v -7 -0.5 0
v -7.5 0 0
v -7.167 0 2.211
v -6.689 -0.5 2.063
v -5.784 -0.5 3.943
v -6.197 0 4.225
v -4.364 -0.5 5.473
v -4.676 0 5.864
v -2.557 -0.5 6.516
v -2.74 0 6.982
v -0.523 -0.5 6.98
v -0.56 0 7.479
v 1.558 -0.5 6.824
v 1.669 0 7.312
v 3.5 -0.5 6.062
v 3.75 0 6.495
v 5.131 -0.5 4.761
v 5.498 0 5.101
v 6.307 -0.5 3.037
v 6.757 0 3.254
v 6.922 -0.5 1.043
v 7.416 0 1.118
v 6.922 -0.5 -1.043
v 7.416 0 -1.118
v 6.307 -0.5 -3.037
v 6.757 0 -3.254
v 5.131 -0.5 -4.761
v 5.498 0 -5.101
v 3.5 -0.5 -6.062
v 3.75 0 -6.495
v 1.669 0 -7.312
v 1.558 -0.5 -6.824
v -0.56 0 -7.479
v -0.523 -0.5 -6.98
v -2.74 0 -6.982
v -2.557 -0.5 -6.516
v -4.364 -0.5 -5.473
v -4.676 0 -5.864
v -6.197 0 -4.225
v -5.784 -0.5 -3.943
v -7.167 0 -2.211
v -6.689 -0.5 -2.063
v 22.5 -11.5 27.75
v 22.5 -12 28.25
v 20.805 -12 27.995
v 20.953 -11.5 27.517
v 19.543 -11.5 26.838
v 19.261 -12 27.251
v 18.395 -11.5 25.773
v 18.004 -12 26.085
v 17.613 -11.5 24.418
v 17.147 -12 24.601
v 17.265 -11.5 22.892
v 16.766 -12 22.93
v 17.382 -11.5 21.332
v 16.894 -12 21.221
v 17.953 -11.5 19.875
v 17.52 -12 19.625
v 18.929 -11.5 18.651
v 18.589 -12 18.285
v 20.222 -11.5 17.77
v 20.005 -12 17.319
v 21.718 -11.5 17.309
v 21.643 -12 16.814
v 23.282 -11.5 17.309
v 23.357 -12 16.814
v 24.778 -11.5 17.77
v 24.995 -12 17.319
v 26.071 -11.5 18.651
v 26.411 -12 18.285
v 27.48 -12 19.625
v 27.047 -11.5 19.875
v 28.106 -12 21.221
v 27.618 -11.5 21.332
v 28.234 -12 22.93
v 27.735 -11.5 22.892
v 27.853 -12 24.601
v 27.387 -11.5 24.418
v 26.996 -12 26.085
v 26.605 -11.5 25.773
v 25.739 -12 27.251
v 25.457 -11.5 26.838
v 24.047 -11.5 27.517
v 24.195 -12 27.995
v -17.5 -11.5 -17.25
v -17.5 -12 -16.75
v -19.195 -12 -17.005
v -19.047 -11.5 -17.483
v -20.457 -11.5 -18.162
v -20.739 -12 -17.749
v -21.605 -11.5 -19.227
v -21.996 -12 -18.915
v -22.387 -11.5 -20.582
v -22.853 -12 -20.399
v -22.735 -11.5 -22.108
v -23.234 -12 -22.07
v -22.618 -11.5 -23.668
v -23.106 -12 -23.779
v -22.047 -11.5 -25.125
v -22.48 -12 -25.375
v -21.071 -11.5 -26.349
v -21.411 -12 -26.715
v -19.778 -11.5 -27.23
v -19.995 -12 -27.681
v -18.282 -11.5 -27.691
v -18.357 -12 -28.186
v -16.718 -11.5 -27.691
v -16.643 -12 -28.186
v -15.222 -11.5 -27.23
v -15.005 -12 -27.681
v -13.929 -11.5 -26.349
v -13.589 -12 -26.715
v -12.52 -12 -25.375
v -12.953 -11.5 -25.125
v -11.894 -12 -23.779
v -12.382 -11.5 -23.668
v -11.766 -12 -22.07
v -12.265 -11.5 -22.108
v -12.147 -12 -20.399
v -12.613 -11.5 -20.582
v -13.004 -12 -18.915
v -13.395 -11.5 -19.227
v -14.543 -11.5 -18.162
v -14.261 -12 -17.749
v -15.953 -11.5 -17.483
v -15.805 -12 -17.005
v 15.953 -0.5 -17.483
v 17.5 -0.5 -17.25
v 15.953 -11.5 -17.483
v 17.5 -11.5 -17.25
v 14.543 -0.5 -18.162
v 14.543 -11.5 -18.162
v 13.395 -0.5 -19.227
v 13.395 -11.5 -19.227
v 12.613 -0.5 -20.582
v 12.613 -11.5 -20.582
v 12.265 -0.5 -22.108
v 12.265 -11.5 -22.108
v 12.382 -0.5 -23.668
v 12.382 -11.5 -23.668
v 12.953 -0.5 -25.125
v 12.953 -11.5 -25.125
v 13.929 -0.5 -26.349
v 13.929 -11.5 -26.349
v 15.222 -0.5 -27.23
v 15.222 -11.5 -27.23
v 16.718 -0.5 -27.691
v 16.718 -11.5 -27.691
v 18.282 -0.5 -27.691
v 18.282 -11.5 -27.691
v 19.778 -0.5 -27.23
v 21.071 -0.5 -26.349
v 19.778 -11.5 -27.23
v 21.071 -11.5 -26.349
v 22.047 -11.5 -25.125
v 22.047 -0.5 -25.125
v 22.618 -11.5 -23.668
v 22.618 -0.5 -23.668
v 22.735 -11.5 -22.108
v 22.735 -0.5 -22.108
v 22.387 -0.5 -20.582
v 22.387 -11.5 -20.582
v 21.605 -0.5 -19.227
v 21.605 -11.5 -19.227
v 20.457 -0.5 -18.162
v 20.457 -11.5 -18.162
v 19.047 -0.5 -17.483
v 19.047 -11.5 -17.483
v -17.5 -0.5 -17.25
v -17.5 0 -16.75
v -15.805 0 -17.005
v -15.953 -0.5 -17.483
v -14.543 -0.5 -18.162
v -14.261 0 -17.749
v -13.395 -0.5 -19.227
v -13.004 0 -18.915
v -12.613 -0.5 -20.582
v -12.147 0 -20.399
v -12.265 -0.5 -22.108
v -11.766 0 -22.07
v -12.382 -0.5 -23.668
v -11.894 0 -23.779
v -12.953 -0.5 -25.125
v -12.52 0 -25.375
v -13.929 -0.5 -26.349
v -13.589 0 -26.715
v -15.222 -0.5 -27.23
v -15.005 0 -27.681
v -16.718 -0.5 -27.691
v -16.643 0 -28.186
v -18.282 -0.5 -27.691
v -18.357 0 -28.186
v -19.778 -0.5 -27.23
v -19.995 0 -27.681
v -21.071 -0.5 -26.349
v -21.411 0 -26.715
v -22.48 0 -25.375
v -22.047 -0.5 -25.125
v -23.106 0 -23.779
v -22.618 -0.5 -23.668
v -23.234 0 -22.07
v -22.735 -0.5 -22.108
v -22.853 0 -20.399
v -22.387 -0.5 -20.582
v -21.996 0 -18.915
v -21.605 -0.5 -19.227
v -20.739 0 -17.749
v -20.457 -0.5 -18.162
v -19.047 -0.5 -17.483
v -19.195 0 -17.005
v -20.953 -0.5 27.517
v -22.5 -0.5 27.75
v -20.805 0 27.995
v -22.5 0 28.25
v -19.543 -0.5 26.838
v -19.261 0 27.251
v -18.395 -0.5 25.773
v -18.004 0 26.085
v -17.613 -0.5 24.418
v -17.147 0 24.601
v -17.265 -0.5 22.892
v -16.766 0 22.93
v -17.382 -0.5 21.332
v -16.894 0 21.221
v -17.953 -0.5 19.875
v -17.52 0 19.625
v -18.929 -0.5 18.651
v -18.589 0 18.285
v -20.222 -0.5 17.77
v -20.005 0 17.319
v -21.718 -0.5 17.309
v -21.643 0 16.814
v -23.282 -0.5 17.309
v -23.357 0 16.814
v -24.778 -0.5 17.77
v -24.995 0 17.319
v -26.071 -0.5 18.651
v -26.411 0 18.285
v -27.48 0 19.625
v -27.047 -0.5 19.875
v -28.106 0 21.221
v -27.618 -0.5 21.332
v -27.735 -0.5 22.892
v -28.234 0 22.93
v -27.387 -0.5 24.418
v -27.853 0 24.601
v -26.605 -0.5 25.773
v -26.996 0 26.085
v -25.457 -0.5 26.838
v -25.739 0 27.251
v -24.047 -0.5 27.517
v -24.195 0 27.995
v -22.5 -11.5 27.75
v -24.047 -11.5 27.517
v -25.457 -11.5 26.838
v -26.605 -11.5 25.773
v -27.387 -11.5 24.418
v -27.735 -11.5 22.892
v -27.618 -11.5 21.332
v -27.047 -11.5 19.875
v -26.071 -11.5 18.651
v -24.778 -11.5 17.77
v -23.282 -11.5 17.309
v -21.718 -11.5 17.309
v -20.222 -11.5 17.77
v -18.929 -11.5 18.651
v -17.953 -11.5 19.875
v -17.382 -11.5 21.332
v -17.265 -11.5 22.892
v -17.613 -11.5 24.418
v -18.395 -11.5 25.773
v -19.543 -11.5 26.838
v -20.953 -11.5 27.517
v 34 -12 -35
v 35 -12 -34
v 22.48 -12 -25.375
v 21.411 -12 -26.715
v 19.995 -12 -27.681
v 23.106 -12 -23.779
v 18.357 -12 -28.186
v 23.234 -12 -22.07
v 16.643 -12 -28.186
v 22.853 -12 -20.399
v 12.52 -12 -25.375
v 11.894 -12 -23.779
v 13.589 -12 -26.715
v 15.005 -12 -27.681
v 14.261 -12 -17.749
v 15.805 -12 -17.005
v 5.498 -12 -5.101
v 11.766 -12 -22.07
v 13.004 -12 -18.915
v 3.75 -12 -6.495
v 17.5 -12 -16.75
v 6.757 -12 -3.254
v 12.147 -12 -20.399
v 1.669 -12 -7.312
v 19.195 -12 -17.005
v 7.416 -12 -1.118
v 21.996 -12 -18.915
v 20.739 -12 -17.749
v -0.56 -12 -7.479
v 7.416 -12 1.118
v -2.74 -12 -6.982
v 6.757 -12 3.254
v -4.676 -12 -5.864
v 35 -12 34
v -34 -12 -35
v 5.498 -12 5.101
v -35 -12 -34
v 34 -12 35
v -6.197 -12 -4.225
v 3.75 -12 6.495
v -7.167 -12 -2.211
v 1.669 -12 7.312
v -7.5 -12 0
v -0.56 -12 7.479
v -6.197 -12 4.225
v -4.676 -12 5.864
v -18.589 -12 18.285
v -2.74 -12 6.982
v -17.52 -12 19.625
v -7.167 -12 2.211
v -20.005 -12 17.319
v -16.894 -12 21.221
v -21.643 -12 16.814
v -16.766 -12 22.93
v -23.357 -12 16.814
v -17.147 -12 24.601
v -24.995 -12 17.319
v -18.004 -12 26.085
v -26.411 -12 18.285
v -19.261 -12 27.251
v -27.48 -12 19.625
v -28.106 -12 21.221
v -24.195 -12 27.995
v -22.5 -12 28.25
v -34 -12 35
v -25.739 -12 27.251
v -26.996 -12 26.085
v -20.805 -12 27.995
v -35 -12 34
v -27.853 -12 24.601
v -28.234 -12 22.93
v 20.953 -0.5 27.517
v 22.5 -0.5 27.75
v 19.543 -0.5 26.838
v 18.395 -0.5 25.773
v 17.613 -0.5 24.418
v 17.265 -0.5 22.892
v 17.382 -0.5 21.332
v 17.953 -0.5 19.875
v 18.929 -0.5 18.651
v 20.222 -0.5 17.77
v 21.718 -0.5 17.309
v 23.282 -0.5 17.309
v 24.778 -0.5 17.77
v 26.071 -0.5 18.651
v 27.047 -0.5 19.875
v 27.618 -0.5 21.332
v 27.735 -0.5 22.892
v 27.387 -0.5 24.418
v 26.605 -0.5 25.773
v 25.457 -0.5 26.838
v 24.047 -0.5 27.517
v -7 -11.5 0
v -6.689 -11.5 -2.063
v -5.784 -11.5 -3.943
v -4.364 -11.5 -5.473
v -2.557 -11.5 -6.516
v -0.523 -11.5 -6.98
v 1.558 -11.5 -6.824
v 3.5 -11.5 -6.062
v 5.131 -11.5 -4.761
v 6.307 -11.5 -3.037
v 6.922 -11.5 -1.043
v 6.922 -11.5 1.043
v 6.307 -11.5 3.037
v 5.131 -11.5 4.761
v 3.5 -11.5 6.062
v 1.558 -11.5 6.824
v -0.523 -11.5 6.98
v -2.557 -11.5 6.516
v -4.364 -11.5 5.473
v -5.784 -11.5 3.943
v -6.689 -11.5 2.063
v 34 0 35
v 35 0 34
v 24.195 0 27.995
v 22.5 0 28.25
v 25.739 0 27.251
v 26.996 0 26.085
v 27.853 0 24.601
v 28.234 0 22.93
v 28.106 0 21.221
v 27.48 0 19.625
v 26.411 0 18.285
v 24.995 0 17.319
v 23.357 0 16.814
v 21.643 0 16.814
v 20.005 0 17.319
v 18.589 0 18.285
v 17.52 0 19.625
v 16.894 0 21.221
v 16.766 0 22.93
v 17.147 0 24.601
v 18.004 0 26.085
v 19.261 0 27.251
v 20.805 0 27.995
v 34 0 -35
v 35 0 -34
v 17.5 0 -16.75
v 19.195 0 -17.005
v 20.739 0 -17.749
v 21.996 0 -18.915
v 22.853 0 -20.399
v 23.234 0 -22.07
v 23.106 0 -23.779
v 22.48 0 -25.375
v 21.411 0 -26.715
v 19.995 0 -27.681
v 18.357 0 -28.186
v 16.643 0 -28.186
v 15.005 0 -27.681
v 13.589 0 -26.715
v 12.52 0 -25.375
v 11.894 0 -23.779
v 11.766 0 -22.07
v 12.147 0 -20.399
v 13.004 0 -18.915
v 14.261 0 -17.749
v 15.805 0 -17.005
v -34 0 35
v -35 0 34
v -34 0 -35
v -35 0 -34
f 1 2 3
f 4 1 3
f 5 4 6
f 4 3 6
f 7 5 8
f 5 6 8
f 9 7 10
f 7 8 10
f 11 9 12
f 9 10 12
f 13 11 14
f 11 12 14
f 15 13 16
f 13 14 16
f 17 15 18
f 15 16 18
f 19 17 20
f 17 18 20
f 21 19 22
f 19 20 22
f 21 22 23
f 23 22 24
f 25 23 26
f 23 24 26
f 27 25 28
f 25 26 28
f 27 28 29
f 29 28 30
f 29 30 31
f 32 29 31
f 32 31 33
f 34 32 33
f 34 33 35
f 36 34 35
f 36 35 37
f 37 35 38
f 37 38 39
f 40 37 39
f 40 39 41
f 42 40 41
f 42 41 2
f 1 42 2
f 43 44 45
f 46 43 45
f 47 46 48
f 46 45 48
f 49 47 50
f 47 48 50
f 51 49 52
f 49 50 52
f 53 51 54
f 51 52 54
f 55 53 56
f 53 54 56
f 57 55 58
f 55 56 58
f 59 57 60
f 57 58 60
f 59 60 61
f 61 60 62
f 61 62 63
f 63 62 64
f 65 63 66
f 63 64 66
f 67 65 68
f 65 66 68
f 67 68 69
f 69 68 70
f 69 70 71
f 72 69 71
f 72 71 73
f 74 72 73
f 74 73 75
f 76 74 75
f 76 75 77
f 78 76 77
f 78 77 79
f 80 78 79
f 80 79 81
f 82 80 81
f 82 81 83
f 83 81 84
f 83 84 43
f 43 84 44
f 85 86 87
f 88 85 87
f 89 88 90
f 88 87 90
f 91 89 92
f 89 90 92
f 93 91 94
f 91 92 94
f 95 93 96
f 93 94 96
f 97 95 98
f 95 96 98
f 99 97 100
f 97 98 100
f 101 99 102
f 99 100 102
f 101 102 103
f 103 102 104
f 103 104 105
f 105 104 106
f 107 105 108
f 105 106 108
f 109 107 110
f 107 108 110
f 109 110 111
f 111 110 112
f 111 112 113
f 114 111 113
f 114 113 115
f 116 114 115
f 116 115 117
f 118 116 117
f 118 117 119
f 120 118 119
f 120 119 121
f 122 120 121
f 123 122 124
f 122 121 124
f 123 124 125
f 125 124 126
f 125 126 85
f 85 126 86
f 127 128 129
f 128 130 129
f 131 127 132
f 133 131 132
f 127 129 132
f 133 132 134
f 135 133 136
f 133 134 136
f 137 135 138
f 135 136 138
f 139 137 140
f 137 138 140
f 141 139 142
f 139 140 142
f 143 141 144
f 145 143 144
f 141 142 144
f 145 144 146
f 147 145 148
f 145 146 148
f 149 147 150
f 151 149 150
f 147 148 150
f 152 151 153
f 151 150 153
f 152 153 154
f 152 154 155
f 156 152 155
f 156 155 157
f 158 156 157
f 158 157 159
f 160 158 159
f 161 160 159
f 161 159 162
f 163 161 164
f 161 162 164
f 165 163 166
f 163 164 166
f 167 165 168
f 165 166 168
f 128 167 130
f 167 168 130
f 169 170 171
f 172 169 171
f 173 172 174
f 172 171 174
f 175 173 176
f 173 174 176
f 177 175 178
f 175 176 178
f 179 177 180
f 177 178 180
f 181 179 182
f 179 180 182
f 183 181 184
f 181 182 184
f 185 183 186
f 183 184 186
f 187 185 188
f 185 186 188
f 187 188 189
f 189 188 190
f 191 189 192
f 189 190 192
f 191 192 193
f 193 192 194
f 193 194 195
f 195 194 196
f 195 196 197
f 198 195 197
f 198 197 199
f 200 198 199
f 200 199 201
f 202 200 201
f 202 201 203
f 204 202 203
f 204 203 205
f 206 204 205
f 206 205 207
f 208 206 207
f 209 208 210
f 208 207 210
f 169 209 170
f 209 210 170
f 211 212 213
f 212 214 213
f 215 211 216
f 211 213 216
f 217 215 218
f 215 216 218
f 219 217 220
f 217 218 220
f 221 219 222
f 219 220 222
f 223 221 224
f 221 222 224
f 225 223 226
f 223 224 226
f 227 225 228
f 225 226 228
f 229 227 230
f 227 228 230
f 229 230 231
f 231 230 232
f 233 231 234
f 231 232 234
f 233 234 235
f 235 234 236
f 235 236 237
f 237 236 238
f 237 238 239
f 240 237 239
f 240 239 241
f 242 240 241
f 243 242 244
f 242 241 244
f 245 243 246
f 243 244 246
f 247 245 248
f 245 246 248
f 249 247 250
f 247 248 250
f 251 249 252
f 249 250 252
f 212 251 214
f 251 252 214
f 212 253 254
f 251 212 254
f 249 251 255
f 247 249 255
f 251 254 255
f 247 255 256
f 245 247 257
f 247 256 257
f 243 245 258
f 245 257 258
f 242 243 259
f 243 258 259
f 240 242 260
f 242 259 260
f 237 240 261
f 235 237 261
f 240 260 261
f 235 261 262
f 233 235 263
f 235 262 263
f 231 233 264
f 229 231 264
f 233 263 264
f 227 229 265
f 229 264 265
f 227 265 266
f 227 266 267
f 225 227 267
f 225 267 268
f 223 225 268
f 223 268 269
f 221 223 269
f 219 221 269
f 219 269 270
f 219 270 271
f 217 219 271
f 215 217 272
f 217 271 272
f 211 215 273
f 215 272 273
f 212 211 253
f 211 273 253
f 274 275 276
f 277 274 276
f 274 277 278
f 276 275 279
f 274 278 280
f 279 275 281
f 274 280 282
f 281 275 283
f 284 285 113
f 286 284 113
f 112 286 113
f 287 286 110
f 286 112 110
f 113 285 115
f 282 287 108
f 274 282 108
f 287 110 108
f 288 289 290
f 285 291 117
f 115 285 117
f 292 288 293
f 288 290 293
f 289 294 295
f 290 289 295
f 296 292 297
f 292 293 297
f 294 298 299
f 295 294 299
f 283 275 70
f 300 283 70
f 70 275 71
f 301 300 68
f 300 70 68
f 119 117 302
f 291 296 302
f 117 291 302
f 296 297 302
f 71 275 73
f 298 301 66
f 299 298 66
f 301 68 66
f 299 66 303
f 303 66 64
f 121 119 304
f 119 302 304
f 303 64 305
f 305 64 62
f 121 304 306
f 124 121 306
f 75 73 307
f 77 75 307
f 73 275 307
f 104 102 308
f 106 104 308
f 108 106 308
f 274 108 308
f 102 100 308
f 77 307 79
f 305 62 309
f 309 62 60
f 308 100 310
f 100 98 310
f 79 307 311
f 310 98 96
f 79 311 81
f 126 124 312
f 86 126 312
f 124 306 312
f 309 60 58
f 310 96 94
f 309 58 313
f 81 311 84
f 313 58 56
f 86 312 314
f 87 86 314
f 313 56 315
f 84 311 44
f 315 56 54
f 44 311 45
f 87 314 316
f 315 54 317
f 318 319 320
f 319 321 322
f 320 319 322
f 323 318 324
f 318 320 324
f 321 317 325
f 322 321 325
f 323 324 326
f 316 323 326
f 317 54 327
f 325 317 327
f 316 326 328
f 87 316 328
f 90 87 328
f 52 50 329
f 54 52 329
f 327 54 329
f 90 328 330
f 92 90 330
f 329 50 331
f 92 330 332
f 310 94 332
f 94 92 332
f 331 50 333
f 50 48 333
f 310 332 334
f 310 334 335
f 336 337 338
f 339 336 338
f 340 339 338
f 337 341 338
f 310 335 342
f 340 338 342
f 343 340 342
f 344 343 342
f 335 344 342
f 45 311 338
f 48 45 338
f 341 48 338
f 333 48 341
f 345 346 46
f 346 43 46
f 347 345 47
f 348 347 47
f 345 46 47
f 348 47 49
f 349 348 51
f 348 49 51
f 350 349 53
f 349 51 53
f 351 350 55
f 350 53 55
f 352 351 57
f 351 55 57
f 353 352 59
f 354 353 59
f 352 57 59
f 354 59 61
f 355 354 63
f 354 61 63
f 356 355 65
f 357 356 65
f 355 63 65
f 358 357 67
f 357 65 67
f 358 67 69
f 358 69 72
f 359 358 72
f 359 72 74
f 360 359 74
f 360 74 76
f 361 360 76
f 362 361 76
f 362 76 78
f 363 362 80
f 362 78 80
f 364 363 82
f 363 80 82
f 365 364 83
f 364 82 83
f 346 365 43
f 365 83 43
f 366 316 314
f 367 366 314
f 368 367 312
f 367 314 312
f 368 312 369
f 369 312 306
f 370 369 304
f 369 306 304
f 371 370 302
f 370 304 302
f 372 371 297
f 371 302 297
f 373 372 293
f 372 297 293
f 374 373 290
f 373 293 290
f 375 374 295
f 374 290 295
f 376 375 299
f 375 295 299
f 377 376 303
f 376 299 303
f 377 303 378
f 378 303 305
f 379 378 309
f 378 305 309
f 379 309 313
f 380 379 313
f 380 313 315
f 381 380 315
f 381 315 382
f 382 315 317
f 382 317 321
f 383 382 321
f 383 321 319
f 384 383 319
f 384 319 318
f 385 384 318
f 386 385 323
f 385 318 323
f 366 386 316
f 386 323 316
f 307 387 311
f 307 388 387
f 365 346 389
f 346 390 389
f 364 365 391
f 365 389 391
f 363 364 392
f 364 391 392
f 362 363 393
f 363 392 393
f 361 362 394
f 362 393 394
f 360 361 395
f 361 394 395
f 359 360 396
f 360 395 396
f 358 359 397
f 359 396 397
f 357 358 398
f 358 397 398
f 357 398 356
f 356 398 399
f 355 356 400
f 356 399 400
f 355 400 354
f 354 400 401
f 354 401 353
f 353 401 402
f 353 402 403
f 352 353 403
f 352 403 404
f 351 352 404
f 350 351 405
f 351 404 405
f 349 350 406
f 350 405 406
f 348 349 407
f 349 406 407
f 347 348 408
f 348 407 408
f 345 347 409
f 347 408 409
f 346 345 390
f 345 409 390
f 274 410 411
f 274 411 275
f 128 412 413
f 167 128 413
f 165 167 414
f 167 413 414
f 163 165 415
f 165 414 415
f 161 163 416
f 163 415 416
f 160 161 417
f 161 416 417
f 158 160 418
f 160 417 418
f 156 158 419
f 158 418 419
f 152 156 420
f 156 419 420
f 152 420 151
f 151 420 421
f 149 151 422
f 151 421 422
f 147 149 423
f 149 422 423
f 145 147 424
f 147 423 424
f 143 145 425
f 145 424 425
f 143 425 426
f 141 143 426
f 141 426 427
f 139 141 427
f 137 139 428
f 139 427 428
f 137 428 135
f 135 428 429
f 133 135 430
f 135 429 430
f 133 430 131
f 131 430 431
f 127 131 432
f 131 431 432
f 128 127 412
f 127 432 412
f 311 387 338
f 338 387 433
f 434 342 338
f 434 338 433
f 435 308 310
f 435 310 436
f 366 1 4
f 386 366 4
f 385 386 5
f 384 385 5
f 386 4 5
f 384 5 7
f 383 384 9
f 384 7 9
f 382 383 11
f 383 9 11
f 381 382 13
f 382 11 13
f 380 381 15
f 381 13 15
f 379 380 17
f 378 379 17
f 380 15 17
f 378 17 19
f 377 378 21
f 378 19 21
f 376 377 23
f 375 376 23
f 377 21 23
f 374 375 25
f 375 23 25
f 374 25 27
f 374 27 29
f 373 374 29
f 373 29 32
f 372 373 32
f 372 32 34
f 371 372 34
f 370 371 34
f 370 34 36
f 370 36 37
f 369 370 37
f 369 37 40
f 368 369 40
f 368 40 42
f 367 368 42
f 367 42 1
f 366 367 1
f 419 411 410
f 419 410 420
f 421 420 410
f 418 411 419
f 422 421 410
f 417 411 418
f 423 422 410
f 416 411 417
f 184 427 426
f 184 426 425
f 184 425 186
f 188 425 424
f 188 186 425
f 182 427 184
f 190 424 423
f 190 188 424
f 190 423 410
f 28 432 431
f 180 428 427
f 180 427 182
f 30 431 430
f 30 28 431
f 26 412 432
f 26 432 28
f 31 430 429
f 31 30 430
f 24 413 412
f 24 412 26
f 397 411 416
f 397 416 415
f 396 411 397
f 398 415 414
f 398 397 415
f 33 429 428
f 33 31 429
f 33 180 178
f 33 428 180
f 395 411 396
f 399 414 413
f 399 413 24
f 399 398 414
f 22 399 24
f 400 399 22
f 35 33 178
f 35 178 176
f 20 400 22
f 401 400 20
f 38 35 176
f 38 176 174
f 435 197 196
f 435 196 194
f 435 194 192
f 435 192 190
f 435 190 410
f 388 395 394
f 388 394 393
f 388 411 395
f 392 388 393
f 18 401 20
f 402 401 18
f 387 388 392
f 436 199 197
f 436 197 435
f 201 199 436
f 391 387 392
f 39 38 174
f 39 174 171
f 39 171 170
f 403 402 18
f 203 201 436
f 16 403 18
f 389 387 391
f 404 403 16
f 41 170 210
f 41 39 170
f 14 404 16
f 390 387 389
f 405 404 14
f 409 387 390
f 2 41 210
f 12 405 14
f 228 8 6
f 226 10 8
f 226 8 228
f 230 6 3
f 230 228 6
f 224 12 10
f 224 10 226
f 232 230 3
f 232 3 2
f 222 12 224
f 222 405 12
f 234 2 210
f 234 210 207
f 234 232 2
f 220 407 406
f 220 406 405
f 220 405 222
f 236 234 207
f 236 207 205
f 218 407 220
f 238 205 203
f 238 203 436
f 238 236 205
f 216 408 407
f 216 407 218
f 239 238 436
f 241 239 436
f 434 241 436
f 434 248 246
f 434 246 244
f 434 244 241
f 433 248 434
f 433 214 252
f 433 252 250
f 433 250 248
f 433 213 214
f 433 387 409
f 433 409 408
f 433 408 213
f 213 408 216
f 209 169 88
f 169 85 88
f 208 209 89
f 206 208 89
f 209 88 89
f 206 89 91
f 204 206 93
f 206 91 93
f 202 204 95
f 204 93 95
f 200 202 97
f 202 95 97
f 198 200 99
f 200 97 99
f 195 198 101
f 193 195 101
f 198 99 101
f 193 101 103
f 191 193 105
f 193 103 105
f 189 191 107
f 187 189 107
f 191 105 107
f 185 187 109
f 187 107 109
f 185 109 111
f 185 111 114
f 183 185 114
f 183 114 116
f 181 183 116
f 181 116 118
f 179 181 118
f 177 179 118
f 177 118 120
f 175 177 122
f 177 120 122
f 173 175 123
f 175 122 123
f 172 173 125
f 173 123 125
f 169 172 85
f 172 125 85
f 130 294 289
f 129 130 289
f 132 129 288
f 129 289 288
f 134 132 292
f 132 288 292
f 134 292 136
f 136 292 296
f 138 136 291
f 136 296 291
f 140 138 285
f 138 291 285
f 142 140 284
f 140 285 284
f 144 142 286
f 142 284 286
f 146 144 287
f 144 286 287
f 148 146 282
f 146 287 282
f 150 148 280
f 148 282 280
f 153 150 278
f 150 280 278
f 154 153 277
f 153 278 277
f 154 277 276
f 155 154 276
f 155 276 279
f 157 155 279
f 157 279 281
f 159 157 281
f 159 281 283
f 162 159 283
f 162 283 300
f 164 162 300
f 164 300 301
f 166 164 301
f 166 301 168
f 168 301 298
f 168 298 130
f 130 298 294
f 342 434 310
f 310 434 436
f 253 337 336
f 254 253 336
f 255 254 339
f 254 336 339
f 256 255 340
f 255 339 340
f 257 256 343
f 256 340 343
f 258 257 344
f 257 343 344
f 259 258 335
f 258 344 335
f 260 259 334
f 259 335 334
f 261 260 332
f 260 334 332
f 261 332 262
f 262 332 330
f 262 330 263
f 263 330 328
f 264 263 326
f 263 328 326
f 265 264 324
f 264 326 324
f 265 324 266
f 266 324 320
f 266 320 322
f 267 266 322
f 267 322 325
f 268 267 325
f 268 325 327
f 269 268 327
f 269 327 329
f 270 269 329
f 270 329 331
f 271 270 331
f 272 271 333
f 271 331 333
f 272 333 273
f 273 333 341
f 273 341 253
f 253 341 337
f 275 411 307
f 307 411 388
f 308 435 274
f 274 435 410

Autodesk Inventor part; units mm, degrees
ref_plane "YZ Plane" through (0, 0, 0) normal (1, 0, 0) x (0, 1, 0)
ref_plane "XZ Plane" through (0, 0, 0) normal (0, 1, 0) x (-1, 0, 0)
ref_plane "XY Plane" through (0, 0, 0) normal (0, 0, 1) x (1, 0, 0)
sketch "Sketch1" plane through (0, 0, 0) normal (0, 1, 0) x (-1, 0, 0)
  line L0 (-35, 35) -> (35, 35)
  line L1 (35, 35) -> (35, -35)
  line L2 (35, -35) -> (-35, -35)
  line L3 (-35, -35) -> (-35, 35)
  line L4 (-35, 35) -> (35, -35) construction
  line L5 (35, 35) -> (-35, -35) construction
  line L6 (-22.5, 22.5) -> (22.5, 22.5) construction
  line L7 (22.5, 22.5) -> (22.5, -22.5) construction
  line L8 (22.5, -22.5) -> (-22.5, -22.5) construction
  line L9 (-22.5, -22.5) -> (-22.5, 22.5) construction
  line L10 (-22.5, 22.5) -> (22.5, -22.5) construction
  line L11 (22.5, 22.5) -> (-22.5, -22.5) construction
  line L12 (-17.5, 22.5) -> (17.5, 22.5) construction
  line L13 (17.5, 22.5) -> (17.5, -22.5) construction
  line L14 (17.5, -22.5) -> (-17.5, -22.5) construction
  line L15 (-17.5, -22.5) -> (-17.5, 22.5) construction
  line L16 (-17.5, 22.5) -> (17.5, -22.5) construction
  line L17 (17.5, 22.5) -> (-17.5, -22.5) construction
  circle A0 centre (0, 0) radius 7
  dimension "d0" = 70
  dimension "d1" = 45
  dimension "d2" = 35
  dimension "d3" = 14
  dimension "d16" = 70
  dimension "d17" = 45
extrude "Extrusion1" add sketch "Sketch1" against normal blind 12
hole "Hole1" at (-17.5, 0, -22.5) at (17.5, 0, -22.5) at (-22.5, 0, 22.5) at (22.5, 0, 22.5) direction (0, -1, 0) diameter 10.5 end through all
chamfer "Chamfer1" distance 0.5 angle 45 10 edges at (17.5, 0, -27.75) (-17.5, 0, -27.75) (22.5, 0, 17.25) (-22.5, 0, 17.25) (17.5, -12, -27.75) (-17.5, -12, -27.75) (22.5, -12, 17.25) (-22.5, -12, 17.25) (7, 0, 0) (7, -12, 0)
chamfer "Chamfer2" distance 1 angle 45 4 edges at (-35, -6, -35) (35, -6, -35) (35, -6, 35) (-35, -6, 35)
properties part number "AP1-002"
